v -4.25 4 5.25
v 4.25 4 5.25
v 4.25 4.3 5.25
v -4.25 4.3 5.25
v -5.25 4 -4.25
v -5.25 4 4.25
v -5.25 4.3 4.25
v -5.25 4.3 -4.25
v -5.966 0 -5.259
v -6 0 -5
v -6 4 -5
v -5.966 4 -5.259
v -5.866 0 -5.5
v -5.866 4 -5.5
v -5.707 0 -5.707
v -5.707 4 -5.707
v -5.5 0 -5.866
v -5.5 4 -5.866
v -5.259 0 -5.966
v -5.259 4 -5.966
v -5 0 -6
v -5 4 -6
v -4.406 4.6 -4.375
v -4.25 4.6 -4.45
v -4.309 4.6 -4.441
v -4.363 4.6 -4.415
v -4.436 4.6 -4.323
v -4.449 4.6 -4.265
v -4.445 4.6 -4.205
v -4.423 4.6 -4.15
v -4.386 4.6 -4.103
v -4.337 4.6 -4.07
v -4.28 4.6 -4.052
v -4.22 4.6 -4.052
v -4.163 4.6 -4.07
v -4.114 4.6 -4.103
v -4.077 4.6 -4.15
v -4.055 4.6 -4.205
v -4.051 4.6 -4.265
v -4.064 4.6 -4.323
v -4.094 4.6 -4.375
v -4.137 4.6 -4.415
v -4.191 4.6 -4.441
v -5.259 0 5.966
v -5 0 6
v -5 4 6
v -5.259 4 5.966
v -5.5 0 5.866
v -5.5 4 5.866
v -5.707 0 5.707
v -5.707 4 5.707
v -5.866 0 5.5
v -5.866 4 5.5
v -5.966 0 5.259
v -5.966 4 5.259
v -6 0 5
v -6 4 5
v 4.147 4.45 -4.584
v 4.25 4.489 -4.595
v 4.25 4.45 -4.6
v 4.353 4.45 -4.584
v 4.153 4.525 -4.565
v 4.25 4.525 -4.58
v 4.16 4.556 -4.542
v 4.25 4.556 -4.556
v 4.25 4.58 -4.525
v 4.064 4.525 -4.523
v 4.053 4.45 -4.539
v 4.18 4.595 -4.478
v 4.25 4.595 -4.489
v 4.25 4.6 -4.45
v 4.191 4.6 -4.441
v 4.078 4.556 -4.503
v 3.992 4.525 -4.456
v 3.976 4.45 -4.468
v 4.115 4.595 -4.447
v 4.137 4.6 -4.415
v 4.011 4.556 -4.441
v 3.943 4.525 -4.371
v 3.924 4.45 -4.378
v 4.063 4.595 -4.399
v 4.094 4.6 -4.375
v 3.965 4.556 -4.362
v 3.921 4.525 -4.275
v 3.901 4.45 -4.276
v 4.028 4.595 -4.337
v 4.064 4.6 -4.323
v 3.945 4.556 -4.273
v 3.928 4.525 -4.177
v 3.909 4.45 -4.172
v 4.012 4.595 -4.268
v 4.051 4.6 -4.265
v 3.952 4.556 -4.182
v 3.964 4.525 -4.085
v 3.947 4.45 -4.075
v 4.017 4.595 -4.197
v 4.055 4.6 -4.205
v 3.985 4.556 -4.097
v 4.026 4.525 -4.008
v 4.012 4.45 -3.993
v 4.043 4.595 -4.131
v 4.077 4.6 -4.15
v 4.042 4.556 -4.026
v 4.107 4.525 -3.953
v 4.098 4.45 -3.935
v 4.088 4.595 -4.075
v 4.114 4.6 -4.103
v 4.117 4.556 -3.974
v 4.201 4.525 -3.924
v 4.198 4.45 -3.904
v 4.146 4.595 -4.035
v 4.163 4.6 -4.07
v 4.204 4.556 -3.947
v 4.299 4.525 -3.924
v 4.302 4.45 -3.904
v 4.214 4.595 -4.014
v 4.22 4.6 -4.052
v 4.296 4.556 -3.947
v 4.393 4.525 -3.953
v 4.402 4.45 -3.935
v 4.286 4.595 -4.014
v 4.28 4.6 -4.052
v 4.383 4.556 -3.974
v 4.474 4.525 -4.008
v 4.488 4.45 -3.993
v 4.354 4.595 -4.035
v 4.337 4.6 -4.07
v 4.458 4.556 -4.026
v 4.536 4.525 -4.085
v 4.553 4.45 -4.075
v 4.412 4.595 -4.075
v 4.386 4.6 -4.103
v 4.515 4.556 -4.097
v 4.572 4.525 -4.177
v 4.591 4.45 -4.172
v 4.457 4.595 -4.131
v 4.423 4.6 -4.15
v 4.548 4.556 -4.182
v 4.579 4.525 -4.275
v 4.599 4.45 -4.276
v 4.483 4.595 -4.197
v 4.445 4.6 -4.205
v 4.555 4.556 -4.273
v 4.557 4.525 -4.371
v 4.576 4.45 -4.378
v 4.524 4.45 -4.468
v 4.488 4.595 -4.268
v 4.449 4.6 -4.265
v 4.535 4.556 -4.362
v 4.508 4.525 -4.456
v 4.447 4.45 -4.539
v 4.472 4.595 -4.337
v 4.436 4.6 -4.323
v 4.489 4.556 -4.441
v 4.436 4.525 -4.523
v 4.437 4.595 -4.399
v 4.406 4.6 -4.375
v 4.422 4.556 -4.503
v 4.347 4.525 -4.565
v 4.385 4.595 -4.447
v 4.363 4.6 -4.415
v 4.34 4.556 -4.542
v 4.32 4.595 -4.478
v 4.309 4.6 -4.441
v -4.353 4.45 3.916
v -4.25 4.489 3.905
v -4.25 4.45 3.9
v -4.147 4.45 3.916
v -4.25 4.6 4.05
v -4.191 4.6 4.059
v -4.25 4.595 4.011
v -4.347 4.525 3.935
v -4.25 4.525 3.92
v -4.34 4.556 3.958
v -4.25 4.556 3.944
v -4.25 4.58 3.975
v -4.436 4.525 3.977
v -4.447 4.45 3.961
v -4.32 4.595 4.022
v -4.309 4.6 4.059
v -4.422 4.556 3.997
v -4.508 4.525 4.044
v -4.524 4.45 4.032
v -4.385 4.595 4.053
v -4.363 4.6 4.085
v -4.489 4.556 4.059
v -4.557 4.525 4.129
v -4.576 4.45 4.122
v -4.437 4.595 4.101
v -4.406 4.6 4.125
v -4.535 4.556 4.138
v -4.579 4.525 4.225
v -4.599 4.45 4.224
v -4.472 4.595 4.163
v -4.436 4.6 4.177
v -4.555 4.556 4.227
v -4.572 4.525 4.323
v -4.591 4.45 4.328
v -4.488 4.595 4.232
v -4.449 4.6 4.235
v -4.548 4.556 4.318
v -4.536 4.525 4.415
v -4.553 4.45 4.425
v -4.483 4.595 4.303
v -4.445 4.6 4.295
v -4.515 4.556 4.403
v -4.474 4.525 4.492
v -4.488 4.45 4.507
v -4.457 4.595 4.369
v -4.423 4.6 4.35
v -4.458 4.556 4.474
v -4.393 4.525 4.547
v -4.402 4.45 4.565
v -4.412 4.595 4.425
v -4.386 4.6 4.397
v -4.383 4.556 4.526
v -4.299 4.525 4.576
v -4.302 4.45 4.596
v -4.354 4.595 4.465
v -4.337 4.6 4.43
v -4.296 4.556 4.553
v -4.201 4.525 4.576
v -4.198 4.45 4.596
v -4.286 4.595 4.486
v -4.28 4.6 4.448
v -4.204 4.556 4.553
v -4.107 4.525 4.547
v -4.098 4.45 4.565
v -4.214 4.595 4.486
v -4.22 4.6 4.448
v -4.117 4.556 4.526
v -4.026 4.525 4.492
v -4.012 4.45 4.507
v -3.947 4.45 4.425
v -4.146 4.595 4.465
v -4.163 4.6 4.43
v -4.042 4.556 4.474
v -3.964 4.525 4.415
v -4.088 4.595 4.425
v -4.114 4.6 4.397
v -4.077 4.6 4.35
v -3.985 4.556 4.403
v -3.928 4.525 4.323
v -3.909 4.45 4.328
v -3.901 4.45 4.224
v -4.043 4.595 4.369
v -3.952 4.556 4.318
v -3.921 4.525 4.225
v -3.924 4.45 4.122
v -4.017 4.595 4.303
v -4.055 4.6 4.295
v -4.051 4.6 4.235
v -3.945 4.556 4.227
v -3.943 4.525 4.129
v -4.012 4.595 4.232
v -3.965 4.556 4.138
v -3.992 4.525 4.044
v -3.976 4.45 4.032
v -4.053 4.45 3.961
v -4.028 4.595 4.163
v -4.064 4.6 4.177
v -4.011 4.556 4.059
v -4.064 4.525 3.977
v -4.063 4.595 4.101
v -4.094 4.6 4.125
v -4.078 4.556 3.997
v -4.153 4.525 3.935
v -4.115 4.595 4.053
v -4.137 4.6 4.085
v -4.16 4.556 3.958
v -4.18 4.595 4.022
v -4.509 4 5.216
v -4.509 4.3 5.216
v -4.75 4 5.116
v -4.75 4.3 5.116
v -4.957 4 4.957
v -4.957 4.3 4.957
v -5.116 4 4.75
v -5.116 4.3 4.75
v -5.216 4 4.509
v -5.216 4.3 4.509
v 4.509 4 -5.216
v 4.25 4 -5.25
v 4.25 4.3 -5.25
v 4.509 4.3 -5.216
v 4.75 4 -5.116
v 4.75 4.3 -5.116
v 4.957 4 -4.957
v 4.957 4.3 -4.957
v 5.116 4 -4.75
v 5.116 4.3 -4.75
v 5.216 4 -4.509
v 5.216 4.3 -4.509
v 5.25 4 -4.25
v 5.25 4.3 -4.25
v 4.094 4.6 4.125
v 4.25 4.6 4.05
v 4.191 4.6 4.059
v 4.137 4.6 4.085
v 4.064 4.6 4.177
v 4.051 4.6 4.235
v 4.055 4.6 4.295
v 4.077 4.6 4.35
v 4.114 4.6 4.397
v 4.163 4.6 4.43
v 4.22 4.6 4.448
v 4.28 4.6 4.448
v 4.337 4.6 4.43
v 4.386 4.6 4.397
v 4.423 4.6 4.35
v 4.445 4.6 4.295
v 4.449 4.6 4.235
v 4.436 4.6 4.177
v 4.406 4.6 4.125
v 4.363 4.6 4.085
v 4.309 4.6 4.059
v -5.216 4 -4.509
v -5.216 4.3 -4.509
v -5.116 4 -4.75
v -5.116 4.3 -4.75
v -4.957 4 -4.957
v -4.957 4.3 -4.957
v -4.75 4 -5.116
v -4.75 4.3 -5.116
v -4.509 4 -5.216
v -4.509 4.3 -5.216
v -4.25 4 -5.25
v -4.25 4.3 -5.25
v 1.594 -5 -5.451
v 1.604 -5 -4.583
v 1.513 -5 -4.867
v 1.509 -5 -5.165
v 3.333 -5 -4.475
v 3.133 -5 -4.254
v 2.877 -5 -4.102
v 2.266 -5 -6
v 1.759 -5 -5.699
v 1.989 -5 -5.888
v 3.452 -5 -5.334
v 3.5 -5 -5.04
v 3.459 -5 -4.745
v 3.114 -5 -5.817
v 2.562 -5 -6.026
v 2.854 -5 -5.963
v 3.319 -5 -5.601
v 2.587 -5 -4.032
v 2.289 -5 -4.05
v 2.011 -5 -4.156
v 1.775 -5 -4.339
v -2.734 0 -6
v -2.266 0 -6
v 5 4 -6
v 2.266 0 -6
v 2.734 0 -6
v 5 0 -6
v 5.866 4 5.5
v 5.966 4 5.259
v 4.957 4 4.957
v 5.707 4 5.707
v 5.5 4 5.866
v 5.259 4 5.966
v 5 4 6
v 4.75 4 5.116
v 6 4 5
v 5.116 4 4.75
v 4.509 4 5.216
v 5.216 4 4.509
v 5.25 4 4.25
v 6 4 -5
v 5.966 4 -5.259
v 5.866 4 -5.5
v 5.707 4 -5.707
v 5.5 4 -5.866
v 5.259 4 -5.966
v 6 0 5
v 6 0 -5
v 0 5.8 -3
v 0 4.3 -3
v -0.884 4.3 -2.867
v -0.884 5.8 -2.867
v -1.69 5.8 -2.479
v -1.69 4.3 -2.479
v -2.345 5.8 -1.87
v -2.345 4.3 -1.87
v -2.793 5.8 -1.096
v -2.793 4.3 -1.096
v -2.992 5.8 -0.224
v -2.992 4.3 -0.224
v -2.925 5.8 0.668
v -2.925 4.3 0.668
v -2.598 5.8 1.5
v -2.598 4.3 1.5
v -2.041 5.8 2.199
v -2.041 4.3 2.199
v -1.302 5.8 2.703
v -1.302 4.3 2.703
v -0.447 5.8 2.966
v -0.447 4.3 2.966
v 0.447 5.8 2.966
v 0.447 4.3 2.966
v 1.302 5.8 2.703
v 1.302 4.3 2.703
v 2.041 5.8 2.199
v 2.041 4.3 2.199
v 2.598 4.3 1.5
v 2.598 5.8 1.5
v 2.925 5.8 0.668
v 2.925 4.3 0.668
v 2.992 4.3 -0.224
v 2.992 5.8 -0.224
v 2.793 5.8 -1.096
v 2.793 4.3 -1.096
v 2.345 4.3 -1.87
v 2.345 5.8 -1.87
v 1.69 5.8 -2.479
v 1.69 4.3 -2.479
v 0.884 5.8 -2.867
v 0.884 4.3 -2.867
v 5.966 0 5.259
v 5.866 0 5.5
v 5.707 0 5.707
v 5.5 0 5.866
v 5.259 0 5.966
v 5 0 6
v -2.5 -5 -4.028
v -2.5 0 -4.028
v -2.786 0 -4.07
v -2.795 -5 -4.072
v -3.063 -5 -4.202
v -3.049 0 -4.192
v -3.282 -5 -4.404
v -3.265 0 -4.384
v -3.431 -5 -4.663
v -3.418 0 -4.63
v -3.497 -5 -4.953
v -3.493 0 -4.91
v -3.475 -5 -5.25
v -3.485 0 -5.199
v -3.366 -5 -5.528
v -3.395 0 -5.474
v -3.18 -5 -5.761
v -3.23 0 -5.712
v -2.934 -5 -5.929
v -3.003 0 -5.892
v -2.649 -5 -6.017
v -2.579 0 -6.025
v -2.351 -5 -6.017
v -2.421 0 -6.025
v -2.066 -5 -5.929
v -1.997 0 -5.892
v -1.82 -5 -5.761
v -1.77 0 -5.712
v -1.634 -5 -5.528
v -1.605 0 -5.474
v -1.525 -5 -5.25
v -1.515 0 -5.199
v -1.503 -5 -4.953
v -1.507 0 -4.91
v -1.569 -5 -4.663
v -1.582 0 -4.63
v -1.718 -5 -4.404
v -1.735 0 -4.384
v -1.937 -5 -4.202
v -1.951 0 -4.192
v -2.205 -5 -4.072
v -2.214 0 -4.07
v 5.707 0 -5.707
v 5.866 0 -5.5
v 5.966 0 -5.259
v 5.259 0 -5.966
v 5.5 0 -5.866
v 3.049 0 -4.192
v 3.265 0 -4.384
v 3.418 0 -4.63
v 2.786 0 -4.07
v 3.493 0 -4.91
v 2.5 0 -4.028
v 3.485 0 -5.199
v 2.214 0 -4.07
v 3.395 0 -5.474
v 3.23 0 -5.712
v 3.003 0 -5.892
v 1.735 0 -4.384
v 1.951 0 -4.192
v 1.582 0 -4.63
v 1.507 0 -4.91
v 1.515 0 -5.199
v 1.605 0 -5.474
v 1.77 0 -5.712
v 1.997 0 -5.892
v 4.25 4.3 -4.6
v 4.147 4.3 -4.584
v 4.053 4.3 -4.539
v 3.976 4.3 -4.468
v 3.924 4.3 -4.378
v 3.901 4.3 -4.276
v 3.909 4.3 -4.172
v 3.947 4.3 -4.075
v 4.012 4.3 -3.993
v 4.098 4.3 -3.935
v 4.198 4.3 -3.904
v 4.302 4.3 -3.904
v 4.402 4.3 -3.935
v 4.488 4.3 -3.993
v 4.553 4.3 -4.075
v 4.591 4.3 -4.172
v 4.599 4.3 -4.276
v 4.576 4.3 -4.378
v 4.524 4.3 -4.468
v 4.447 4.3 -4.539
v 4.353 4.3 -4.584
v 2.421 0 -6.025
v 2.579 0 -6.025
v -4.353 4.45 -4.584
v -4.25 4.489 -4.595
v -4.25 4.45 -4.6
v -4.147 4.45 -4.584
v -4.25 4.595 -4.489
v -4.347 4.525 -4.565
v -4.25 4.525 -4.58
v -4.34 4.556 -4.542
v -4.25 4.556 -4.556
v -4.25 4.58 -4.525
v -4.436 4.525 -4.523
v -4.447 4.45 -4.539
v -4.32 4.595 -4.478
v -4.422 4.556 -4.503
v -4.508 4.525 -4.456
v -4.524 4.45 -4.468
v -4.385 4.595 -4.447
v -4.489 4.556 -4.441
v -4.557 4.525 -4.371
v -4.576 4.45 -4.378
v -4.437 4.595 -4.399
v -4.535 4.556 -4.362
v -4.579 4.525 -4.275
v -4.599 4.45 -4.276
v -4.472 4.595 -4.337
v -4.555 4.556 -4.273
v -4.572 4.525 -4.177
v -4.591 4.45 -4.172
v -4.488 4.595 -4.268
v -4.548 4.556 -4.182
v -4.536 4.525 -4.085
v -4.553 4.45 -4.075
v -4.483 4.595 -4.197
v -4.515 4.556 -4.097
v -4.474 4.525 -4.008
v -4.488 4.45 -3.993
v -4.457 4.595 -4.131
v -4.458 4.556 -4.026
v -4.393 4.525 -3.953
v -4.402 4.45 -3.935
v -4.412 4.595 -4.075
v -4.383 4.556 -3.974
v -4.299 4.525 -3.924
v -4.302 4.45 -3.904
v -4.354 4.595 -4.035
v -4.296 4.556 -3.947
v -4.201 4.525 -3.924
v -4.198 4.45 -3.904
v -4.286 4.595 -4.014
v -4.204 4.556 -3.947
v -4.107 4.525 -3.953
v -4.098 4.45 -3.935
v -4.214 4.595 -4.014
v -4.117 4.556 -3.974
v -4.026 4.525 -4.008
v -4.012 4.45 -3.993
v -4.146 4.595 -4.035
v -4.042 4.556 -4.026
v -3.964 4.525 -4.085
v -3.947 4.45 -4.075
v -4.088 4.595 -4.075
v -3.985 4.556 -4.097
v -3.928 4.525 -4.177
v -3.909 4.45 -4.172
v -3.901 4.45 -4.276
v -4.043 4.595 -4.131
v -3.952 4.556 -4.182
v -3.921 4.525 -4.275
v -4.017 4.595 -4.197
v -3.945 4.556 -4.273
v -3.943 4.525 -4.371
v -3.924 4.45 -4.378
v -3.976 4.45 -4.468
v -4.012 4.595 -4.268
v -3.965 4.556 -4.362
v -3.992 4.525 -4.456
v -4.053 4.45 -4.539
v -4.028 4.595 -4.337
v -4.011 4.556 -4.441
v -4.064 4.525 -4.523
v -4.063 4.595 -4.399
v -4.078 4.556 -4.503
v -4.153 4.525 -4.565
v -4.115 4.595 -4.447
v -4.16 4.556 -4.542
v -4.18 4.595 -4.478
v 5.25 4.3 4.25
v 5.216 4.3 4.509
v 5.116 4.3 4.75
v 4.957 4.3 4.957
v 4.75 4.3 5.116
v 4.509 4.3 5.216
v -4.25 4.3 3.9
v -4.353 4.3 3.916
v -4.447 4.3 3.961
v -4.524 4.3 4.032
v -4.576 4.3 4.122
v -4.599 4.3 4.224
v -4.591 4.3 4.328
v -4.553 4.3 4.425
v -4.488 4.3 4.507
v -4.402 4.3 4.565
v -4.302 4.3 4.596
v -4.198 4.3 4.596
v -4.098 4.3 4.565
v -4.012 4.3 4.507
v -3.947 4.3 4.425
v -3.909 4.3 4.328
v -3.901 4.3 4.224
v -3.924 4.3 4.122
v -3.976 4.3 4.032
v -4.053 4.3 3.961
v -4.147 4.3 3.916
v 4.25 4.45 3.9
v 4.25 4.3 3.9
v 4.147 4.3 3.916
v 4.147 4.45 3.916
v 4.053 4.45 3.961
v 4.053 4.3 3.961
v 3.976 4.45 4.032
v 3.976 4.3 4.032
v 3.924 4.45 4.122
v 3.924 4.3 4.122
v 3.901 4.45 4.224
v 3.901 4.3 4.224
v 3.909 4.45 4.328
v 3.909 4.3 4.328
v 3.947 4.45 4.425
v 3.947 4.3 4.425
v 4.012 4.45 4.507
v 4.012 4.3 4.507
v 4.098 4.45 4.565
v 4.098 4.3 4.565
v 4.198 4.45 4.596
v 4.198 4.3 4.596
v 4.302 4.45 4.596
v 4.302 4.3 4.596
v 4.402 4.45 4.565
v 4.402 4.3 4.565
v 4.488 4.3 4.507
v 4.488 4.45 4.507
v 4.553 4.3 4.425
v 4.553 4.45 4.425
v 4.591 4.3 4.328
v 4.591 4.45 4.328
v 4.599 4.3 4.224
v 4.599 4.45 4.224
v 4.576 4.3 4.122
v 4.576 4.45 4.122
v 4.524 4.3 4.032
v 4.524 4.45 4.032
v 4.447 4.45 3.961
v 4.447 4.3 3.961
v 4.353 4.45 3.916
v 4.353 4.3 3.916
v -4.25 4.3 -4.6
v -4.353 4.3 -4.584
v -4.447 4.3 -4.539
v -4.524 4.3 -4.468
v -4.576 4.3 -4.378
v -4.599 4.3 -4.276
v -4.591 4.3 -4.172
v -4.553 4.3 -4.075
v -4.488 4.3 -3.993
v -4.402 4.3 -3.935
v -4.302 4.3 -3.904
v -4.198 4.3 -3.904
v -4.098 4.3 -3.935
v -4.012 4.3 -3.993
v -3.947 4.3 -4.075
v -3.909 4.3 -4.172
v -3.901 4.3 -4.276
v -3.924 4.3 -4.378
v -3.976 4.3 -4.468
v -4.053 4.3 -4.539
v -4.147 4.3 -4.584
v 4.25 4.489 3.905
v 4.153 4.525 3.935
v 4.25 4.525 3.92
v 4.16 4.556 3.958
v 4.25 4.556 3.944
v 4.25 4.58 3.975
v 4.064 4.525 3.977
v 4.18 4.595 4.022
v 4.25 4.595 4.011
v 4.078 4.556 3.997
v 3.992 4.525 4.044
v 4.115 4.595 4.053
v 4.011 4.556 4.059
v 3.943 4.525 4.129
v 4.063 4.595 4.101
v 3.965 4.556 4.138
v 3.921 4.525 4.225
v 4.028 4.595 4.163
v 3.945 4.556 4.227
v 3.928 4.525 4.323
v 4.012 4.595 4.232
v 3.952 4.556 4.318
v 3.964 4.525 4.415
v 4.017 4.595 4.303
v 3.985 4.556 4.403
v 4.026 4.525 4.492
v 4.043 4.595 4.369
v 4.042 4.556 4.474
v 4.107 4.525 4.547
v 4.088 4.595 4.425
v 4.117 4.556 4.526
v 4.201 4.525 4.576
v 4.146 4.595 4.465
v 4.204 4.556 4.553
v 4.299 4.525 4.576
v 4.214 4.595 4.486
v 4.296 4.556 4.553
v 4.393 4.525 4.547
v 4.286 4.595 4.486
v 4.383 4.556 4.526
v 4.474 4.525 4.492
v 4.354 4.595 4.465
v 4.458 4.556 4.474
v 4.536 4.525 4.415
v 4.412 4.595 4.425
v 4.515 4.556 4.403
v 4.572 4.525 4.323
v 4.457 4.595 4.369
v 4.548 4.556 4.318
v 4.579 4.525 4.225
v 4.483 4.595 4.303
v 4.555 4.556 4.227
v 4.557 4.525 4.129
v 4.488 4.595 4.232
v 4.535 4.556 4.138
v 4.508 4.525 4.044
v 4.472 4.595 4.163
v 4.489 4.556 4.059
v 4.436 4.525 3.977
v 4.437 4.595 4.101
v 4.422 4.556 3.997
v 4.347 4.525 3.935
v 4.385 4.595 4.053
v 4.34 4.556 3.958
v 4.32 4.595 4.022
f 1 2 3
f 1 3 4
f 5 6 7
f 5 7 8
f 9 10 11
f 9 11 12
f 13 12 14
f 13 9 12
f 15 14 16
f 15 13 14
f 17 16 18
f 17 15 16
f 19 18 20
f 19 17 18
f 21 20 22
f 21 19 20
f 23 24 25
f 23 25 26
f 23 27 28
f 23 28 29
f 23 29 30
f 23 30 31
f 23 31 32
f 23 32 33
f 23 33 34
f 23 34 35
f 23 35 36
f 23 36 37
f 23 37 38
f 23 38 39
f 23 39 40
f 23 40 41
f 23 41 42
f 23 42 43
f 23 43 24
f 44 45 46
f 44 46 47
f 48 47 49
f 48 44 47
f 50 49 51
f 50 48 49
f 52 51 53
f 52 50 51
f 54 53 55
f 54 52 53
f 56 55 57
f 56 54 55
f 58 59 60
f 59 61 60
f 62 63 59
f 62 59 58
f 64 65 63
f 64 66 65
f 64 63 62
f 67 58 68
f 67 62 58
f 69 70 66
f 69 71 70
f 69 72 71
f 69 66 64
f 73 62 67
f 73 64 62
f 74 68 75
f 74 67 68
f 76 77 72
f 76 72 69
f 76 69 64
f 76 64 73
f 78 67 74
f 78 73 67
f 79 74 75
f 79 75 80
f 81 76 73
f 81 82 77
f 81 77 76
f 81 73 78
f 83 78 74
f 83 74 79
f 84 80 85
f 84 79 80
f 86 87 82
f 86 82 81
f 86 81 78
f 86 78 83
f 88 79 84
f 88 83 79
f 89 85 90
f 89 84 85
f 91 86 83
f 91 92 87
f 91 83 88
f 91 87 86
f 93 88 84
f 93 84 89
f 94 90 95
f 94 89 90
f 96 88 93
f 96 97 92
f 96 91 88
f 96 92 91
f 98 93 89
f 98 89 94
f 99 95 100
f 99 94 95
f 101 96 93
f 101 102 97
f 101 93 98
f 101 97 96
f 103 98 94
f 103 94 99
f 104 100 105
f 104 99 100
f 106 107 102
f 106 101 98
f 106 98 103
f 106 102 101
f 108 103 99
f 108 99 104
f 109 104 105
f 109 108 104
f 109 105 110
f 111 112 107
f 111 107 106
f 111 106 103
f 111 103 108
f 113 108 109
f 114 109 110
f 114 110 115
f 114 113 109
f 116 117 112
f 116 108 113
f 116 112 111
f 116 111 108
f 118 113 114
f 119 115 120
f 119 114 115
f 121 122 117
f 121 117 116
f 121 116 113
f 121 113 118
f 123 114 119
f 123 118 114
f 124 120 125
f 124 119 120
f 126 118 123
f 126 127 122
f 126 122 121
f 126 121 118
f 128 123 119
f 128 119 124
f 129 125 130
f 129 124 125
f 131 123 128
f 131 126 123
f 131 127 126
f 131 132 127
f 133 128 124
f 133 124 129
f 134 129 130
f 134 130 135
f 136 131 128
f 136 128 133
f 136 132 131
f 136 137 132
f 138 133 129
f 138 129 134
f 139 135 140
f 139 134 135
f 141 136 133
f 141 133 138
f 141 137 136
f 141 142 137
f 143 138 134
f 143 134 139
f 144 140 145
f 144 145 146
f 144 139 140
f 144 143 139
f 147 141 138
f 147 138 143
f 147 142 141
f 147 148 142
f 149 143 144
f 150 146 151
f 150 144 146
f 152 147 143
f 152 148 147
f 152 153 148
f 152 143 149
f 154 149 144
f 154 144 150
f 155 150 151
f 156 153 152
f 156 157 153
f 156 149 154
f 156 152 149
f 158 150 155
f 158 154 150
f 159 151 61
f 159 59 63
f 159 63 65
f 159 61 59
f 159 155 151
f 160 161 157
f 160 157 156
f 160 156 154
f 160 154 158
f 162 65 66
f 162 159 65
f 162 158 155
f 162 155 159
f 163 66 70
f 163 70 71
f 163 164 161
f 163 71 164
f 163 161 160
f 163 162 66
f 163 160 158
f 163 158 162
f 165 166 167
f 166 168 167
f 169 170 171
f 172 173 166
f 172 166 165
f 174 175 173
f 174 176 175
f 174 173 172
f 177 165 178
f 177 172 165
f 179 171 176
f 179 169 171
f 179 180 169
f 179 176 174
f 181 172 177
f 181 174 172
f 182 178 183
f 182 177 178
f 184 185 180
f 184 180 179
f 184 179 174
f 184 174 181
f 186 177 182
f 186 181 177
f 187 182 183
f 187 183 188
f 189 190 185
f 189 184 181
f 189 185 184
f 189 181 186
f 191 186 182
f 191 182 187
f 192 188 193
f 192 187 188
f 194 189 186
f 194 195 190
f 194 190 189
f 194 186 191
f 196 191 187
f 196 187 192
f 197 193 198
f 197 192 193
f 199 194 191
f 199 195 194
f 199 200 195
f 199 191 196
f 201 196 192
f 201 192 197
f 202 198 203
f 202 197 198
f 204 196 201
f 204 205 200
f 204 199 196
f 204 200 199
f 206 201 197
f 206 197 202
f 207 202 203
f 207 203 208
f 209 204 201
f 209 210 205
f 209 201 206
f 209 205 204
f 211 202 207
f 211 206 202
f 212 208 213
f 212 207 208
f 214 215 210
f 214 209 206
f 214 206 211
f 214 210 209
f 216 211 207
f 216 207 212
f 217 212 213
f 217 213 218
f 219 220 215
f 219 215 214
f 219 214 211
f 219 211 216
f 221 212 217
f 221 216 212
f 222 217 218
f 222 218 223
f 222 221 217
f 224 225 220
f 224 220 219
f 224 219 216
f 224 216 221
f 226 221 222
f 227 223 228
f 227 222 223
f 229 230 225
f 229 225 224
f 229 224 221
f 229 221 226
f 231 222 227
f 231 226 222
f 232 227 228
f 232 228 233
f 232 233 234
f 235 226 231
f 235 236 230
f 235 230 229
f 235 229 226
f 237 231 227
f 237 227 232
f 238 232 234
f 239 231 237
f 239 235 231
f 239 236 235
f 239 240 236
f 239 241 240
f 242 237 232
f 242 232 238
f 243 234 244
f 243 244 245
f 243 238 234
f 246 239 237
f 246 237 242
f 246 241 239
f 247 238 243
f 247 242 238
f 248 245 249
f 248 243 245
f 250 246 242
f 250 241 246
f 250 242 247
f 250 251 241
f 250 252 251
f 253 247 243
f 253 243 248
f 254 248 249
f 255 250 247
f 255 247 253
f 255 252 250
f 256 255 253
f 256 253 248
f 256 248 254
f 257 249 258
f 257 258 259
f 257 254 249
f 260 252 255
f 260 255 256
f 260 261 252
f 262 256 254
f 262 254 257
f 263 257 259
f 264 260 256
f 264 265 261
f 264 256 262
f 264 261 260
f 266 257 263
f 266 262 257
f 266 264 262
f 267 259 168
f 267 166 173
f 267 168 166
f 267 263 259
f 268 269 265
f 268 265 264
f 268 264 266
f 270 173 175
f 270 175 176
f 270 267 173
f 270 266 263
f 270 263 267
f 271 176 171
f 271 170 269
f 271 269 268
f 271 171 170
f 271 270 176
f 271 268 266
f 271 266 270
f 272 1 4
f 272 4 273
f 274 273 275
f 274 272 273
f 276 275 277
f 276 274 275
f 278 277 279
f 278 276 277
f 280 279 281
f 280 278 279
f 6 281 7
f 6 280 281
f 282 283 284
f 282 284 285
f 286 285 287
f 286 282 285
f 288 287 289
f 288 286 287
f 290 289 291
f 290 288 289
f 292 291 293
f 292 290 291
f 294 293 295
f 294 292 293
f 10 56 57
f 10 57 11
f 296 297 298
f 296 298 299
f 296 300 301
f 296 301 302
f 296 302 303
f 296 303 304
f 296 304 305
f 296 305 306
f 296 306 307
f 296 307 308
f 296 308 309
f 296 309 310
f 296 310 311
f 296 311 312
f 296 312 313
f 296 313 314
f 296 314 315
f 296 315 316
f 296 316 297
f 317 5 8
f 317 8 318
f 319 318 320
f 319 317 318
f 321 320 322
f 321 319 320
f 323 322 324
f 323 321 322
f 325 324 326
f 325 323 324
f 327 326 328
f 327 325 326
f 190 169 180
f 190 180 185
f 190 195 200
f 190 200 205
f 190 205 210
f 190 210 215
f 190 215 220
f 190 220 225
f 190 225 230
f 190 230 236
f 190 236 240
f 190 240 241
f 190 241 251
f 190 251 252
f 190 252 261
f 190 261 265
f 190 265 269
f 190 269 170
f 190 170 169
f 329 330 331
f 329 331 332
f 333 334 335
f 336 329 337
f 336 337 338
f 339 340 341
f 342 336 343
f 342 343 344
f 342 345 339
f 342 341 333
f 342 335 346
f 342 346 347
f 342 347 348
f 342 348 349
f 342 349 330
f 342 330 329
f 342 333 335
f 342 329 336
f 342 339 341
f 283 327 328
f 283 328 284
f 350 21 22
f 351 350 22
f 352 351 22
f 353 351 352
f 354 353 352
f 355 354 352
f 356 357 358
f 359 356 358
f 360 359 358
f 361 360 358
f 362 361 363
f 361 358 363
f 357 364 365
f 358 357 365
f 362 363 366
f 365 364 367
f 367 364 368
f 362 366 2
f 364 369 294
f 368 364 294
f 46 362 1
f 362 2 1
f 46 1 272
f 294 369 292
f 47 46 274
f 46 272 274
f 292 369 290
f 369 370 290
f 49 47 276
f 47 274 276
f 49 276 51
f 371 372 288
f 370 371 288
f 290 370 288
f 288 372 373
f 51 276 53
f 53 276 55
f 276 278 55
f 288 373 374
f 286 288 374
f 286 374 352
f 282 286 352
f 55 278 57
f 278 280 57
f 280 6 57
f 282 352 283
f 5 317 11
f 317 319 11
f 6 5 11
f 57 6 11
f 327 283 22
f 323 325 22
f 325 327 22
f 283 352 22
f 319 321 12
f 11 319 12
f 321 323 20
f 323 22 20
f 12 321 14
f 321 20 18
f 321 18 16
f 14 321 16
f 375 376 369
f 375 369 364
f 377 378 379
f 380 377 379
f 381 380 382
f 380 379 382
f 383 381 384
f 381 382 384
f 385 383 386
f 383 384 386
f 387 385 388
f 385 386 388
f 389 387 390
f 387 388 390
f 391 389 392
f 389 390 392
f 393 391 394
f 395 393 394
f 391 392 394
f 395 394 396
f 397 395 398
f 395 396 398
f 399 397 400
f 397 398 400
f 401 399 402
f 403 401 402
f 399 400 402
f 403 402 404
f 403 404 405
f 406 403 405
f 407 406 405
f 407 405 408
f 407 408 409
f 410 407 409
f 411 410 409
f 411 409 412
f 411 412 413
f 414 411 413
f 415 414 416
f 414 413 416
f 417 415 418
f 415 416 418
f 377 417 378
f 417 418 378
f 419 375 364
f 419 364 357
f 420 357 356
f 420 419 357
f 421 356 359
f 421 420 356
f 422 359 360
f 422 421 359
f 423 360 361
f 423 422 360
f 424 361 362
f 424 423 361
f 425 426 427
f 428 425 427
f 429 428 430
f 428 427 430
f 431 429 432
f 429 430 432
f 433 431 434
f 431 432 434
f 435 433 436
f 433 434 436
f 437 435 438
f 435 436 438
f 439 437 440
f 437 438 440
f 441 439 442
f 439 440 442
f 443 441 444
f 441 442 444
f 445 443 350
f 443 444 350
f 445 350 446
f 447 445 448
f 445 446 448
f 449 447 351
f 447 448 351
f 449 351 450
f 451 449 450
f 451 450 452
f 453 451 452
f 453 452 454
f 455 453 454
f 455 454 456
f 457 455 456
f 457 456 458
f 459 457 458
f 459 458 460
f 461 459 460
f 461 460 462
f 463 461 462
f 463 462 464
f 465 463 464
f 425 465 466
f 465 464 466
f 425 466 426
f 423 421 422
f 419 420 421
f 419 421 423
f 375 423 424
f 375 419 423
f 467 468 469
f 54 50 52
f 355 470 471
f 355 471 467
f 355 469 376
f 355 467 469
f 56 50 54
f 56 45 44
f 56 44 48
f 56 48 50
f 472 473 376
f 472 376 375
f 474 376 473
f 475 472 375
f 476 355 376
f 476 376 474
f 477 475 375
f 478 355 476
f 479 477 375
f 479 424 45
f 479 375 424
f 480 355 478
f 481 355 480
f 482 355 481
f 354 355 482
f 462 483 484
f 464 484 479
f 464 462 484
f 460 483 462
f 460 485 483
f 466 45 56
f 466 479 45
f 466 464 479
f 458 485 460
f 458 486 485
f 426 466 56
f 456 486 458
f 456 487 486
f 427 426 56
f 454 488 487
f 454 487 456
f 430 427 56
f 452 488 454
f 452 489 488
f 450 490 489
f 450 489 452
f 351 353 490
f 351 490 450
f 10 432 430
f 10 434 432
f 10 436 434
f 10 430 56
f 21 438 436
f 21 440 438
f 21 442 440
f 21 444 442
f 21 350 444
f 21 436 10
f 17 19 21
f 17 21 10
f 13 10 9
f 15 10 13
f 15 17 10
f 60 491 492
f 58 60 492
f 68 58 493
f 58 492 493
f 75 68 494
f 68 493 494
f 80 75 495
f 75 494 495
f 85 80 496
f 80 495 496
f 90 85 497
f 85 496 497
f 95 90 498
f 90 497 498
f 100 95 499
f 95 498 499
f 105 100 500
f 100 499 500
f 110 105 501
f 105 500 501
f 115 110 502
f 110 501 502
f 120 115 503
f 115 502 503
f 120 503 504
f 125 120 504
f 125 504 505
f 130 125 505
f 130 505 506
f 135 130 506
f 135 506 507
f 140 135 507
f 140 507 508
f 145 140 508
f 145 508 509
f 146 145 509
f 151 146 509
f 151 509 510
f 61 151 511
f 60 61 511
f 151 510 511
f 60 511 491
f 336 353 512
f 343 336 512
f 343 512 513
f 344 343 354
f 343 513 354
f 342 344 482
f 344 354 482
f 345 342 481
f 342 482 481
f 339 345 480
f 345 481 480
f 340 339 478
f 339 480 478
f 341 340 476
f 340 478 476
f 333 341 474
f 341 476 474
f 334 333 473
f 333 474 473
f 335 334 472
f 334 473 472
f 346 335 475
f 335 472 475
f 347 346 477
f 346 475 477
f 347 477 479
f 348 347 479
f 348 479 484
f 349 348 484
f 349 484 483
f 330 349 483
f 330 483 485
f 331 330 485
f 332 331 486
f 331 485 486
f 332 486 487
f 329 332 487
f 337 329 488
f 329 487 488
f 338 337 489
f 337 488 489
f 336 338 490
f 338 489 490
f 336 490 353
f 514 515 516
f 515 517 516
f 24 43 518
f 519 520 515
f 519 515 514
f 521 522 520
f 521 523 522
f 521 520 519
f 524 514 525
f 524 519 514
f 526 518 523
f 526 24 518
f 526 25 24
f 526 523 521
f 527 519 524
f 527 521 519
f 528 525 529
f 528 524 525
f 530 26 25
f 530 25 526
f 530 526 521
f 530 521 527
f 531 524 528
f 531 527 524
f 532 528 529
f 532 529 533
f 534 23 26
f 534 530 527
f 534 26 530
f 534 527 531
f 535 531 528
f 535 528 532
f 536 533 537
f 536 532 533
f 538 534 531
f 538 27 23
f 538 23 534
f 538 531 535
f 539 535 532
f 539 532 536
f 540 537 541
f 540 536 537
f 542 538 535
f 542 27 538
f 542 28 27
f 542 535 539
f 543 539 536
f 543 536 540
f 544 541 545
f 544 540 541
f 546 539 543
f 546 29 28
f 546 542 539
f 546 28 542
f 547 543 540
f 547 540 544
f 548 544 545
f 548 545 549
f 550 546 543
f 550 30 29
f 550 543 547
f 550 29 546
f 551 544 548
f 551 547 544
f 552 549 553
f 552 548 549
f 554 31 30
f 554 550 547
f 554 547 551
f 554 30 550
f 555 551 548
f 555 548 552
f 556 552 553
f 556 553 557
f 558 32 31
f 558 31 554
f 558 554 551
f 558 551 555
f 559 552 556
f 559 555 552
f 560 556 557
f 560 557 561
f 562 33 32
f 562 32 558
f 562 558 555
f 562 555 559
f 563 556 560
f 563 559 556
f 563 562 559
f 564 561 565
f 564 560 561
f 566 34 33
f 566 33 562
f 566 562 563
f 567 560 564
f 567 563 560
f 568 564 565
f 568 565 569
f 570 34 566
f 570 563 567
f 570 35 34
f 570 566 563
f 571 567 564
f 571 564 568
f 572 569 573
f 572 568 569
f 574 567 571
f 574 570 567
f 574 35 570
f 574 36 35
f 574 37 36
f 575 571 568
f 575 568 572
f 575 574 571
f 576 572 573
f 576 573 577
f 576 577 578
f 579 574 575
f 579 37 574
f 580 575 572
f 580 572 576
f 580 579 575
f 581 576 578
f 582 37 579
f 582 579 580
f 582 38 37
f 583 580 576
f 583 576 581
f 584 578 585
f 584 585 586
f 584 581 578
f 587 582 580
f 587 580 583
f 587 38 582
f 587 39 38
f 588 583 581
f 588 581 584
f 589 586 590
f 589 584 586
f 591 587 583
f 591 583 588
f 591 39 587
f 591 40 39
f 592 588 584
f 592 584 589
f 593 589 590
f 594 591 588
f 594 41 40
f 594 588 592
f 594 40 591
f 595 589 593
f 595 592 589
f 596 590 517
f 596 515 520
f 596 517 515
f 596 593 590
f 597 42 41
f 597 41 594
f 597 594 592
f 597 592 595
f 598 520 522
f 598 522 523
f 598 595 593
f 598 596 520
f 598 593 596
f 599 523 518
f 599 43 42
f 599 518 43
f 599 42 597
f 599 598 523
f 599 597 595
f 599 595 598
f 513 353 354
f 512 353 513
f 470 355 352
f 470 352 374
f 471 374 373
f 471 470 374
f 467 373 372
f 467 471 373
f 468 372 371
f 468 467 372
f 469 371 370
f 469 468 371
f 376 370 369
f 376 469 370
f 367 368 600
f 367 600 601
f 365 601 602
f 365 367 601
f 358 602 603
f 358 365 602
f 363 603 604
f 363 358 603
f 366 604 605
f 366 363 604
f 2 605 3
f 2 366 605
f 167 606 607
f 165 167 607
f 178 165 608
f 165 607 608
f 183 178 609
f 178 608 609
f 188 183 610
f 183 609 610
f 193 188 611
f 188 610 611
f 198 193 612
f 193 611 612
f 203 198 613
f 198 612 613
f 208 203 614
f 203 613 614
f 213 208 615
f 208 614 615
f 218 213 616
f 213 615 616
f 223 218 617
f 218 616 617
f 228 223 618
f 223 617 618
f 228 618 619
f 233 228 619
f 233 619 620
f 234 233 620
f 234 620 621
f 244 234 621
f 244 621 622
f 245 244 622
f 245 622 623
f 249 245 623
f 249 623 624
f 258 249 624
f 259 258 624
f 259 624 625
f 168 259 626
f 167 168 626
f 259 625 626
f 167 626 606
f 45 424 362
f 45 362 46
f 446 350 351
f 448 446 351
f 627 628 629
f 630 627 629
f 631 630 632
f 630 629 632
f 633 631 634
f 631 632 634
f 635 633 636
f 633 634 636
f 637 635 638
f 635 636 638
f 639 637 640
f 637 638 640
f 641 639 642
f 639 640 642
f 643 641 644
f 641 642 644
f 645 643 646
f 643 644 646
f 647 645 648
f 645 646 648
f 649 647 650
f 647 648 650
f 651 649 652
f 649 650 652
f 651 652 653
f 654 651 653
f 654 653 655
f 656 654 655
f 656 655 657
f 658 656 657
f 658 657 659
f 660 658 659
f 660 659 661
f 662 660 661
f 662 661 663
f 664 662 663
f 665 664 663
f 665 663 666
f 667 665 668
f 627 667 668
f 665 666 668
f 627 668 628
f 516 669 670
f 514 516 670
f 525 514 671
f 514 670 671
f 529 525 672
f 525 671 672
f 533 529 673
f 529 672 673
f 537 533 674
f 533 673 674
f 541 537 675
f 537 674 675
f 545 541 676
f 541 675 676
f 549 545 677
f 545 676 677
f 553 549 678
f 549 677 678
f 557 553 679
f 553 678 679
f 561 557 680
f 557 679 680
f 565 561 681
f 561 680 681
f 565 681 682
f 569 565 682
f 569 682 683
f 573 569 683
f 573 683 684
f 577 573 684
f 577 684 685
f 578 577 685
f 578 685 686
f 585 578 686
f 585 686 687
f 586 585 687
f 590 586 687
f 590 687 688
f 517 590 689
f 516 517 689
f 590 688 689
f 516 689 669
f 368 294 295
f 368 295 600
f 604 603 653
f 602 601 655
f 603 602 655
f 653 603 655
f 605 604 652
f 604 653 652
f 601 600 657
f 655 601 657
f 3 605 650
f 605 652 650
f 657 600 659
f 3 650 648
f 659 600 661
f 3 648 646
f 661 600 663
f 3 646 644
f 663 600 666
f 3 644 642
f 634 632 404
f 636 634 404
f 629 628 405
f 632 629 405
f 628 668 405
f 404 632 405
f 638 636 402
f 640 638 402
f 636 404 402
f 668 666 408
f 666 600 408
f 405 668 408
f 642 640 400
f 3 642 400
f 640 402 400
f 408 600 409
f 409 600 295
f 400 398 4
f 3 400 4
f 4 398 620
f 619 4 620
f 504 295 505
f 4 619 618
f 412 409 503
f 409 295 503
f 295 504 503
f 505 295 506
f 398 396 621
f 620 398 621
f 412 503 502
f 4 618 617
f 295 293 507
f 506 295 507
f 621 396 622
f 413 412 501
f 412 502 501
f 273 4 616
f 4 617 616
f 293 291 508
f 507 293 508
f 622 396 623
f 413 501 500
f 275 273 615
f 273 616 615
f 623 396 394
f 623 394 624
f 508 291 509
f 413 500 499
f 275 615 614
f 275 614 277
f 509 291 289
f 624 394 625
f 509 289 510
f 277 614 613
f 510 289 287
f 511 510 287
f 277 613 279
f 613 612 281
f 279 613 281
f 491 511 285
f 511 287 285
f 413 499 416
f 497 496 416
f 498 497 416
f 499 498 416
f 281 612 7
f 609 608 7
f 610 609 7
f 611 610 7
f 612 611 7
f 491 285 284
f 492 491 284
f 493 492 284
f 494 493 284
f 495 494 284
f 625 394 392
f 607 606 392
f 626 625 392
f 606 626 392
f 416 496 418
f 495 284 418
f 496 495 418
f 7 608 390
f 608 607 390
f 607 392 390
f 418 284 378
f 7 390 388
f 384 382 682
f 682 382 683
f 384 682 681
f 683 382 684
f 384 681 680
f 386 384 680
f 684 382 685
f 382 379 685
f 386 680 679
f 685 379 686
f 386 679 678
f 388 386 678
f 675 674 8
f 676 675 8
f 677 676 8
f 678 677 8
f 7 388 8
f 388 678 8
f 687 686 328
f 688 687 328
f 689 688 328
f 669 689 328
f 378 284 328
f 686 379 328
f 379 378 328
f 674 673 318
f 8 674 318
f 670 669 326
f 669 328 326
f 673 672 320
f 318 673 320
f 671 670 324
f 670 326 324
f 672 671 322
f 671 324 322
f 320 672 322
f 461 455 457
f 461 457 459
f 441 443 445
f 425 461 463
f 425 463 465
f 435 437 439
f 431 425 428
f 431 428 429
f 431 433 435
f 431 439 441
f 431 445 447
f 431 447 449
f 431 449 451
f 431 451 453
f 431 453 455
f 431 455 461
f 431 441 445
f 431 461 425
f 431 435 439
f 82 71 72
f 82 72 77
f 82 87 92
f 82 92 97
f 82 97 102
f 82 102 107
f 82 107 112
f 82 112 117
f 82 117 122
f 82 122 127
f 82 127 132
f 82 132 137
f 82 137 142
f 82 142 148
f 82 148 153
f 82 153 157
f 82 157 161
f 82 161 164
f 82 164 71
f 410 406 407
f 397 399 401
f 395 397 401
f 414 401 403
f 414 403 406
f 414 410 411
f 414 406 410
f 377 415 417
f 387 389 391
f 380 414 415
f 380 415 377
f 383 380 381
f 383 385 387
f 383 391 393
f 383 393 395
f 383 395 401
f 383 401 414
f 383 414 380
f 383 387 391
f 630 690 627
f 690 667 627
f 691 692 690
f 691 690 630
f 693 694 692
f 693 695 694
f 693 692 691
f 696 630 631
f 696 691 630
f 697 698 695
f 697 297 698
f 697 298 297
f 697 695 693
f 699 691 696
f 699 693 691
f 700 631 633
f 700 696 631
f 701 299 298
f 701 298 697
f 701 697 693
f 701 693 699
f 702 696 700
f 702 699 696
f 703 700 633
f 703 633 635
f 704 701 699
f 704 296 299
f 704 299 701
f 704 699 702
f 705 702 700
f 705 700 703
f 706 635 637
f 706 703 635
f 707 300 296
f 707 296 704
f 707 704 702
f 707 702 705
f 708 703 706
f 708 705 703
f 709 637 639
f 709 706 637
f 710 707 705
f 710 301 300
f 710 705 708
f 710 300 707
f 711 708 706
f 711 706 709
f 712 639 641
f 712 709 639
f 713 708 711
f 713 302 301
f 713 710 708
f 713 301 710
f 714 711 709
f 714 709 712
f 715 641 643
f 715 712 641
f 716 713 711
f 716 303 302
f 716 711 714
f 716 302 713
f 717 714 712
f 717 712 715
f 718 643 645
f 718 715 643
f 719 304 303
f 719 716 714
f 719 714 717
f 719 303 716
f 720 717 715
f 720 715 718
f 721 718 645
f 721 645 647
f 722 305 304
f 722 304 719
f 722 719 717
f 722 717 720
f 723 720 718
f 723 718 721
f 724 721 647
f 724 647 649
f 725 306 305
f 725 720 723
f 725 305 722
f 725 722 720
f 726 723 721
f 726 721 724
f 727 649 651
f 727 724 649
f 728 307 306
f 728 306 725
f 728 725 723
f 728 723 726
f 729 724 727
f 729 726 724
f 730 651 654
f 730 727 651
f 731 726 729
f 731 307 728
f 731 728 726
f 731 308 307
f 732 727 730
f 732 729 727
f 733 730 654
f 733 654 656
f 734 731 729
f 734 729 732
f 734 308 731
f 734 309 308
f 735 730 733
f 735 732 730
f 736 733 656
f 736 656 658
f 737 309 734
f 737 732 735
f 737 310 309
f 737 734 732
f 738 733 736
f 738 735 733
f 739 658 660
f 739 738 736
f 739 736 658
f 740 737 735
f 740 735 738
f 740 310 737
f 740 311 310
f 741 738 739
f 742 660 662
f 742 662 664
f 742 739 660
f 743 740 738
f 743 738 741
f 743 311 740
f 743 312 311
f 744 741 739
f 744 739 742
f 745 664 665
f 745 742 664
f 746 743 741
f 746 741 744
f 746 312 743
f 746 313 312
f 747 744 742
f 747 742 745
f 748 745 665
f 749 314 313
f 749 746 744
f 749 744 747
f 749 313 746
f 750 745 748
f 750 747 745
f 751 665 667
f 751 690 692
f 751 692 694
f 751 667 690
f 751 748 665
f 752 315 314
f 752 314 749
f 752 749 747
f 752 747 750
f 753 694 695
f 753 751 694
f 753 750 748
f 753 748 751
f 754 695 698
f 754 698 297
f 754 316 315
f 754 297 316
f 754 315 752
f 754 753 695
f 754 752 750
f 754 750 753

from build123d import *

# Parameters (mm, degrees)
BOSS_EXTRUDE1_DEPTH = 4
BOSS_EXTRUDE2_DEPTH = 0.3
SKETCH3_R           = 0.35
BOSS_EXTRUDE3_DEPTH = 0.3
FILLET2_R           = 0.15
FILLET3_R           = 0.15
SKETCH4_R           = 3
BOSS_EXTRUDE4_DEPTH = 1.5
SKETCH5_R           = 1
BOSS_EXTRUDE5_DEPTH = 5


with BuildPart() as part:
    # Sketch1 → Boss-Extrude1 (new body)
    with BuildSketch(Plane(origin=(0, 0, 0), x_dir=(1, 0, 0), z_dir=(0, 1, 0))):
        with BuildLine():
            Line((-5, 6), (5, 6))
            ThreePointArc((5, 6), (5.707106781, 5.707106781), (6, 5))
            Line((6, 5), (6, -5))
            ThreePointArc((6, -5), (5.707106781, -5.707106781), (5, -6))
            Line((5, -6), (-5, -6))
            ThreePointArc((-5, -6), (-5.707106781, -5.707106781), (-6, -5))
            Line((-6, -5), (-6, 5))
            ThreePointArc((-6, 5), (-5.707106781, 5.707106781), (-5, 6))
        make_face()
    extrude(amount=BOSS_EXTRUDE1_DEPTH)

    # Sketch2 → Boss-Extrude2 (add)
    with BuildSketch(Plane(origin=(0, 4, 0), x_dir=(1, 0, 0), z_dir=(0, 1, 0))):
        with BuildLine():
            Line((-4.25, 5.25), (4.25, 5.25))
            ThreePointArc((4.25, 5.25), (4.957106781, 4.957106781), (5.25, 4.25))
            Line((5.25, 4.25), (5.25, -4.25))
            ThreePointArc((5.25, -4.25), (4.957106781, -4.957106781), (4.25, -5.25))
            Line((4.25, -5.25), (-4.25, -5.25))
            ThreePointArc((-4.25, -5.25), (-4.957106781, -4.957106781), (-5.25, -4.25))
            Line((-5.25, -4.25), (-5.25, 4.25))
            ThreePointArc((-5.25, 4.25), (-4.957106781, 4.957106781), (-4.25, 5.25))
        make_face()
    extrude(amount=BOSS_EXTRUDE2_DEPTH)

    # Sketch3 → Boss-Extrude3 (add)
    with BuildSketch(Plane(origin=(0, 4.3, 0), x_dir=(1, 0, 0), z_dir=(0, 1, 0))):
        with Locations(Location((4.25, 4.25, 0), (0, 0, 90))):
            Circle(SKETCH3_R)
        with Locations(Location((4.25, -4.25, 0), (0, 0, 90))):
            Circle(SKETCH3_R)
        with Locations(Location((-4.25, -4.25, 0), (0, 0, 90))):
            Circle(SKETCH3_R)
        with Locations(Location((-4.25, 4.25, 0), (0, 0, 90))):
            Circle(SKETCH3_R)
    extrude(amount=BOSS_EXTRUDE3_DEPTH)

    # Fillet2
    fillet2_edges = [part.edges().sort_by_distance(p)[0] for p in [
        (-4.25, 4.6, -3.9),
    ]]
    fillet(fillet2_edges, radius=FILLET2_R)

    # Fillet3
    fillet3_edges = [part.edges().sort_by_distance(p)[0] for p in [
        (4.25, 4.6, -3.9),
        (4.25, 4.6, 4.6),
        (-4.25, 4.6, 4.6),
    ]]
    fillet(fillet3_edges, radius=FILLET3_R)

    # Sketch4 → Boss-Extrude4 (add)
    with BuildSketch(Plane(origin=(0, 4.3, 0), x_dir=(1, 0, 0), z_dir=(0, 1, 0))):
        with Locations(Location((0, 0, 0), (0, 0, 90))):
            Circle(SKETCH4_R)
    extrude(amount=BOSS_EXTRUDE4_DEPTH)

    # Sketch5 → Boss-Extrude5 (add)
    with BuildSketch(Plane.XZ):
        with Locations(Location((2.5, -5.027876242, 0), (0, 0, 256.439715219))):
            Circle(SKETCH5_R)
        with Locations(Location((-2.5, -5.027876242, 0), (0, 0, 90))):
            Circle(SKETCH5_R)
    extrude(amount=BOSS_EXTRUDE5_DEPTH)


solid = part.part
